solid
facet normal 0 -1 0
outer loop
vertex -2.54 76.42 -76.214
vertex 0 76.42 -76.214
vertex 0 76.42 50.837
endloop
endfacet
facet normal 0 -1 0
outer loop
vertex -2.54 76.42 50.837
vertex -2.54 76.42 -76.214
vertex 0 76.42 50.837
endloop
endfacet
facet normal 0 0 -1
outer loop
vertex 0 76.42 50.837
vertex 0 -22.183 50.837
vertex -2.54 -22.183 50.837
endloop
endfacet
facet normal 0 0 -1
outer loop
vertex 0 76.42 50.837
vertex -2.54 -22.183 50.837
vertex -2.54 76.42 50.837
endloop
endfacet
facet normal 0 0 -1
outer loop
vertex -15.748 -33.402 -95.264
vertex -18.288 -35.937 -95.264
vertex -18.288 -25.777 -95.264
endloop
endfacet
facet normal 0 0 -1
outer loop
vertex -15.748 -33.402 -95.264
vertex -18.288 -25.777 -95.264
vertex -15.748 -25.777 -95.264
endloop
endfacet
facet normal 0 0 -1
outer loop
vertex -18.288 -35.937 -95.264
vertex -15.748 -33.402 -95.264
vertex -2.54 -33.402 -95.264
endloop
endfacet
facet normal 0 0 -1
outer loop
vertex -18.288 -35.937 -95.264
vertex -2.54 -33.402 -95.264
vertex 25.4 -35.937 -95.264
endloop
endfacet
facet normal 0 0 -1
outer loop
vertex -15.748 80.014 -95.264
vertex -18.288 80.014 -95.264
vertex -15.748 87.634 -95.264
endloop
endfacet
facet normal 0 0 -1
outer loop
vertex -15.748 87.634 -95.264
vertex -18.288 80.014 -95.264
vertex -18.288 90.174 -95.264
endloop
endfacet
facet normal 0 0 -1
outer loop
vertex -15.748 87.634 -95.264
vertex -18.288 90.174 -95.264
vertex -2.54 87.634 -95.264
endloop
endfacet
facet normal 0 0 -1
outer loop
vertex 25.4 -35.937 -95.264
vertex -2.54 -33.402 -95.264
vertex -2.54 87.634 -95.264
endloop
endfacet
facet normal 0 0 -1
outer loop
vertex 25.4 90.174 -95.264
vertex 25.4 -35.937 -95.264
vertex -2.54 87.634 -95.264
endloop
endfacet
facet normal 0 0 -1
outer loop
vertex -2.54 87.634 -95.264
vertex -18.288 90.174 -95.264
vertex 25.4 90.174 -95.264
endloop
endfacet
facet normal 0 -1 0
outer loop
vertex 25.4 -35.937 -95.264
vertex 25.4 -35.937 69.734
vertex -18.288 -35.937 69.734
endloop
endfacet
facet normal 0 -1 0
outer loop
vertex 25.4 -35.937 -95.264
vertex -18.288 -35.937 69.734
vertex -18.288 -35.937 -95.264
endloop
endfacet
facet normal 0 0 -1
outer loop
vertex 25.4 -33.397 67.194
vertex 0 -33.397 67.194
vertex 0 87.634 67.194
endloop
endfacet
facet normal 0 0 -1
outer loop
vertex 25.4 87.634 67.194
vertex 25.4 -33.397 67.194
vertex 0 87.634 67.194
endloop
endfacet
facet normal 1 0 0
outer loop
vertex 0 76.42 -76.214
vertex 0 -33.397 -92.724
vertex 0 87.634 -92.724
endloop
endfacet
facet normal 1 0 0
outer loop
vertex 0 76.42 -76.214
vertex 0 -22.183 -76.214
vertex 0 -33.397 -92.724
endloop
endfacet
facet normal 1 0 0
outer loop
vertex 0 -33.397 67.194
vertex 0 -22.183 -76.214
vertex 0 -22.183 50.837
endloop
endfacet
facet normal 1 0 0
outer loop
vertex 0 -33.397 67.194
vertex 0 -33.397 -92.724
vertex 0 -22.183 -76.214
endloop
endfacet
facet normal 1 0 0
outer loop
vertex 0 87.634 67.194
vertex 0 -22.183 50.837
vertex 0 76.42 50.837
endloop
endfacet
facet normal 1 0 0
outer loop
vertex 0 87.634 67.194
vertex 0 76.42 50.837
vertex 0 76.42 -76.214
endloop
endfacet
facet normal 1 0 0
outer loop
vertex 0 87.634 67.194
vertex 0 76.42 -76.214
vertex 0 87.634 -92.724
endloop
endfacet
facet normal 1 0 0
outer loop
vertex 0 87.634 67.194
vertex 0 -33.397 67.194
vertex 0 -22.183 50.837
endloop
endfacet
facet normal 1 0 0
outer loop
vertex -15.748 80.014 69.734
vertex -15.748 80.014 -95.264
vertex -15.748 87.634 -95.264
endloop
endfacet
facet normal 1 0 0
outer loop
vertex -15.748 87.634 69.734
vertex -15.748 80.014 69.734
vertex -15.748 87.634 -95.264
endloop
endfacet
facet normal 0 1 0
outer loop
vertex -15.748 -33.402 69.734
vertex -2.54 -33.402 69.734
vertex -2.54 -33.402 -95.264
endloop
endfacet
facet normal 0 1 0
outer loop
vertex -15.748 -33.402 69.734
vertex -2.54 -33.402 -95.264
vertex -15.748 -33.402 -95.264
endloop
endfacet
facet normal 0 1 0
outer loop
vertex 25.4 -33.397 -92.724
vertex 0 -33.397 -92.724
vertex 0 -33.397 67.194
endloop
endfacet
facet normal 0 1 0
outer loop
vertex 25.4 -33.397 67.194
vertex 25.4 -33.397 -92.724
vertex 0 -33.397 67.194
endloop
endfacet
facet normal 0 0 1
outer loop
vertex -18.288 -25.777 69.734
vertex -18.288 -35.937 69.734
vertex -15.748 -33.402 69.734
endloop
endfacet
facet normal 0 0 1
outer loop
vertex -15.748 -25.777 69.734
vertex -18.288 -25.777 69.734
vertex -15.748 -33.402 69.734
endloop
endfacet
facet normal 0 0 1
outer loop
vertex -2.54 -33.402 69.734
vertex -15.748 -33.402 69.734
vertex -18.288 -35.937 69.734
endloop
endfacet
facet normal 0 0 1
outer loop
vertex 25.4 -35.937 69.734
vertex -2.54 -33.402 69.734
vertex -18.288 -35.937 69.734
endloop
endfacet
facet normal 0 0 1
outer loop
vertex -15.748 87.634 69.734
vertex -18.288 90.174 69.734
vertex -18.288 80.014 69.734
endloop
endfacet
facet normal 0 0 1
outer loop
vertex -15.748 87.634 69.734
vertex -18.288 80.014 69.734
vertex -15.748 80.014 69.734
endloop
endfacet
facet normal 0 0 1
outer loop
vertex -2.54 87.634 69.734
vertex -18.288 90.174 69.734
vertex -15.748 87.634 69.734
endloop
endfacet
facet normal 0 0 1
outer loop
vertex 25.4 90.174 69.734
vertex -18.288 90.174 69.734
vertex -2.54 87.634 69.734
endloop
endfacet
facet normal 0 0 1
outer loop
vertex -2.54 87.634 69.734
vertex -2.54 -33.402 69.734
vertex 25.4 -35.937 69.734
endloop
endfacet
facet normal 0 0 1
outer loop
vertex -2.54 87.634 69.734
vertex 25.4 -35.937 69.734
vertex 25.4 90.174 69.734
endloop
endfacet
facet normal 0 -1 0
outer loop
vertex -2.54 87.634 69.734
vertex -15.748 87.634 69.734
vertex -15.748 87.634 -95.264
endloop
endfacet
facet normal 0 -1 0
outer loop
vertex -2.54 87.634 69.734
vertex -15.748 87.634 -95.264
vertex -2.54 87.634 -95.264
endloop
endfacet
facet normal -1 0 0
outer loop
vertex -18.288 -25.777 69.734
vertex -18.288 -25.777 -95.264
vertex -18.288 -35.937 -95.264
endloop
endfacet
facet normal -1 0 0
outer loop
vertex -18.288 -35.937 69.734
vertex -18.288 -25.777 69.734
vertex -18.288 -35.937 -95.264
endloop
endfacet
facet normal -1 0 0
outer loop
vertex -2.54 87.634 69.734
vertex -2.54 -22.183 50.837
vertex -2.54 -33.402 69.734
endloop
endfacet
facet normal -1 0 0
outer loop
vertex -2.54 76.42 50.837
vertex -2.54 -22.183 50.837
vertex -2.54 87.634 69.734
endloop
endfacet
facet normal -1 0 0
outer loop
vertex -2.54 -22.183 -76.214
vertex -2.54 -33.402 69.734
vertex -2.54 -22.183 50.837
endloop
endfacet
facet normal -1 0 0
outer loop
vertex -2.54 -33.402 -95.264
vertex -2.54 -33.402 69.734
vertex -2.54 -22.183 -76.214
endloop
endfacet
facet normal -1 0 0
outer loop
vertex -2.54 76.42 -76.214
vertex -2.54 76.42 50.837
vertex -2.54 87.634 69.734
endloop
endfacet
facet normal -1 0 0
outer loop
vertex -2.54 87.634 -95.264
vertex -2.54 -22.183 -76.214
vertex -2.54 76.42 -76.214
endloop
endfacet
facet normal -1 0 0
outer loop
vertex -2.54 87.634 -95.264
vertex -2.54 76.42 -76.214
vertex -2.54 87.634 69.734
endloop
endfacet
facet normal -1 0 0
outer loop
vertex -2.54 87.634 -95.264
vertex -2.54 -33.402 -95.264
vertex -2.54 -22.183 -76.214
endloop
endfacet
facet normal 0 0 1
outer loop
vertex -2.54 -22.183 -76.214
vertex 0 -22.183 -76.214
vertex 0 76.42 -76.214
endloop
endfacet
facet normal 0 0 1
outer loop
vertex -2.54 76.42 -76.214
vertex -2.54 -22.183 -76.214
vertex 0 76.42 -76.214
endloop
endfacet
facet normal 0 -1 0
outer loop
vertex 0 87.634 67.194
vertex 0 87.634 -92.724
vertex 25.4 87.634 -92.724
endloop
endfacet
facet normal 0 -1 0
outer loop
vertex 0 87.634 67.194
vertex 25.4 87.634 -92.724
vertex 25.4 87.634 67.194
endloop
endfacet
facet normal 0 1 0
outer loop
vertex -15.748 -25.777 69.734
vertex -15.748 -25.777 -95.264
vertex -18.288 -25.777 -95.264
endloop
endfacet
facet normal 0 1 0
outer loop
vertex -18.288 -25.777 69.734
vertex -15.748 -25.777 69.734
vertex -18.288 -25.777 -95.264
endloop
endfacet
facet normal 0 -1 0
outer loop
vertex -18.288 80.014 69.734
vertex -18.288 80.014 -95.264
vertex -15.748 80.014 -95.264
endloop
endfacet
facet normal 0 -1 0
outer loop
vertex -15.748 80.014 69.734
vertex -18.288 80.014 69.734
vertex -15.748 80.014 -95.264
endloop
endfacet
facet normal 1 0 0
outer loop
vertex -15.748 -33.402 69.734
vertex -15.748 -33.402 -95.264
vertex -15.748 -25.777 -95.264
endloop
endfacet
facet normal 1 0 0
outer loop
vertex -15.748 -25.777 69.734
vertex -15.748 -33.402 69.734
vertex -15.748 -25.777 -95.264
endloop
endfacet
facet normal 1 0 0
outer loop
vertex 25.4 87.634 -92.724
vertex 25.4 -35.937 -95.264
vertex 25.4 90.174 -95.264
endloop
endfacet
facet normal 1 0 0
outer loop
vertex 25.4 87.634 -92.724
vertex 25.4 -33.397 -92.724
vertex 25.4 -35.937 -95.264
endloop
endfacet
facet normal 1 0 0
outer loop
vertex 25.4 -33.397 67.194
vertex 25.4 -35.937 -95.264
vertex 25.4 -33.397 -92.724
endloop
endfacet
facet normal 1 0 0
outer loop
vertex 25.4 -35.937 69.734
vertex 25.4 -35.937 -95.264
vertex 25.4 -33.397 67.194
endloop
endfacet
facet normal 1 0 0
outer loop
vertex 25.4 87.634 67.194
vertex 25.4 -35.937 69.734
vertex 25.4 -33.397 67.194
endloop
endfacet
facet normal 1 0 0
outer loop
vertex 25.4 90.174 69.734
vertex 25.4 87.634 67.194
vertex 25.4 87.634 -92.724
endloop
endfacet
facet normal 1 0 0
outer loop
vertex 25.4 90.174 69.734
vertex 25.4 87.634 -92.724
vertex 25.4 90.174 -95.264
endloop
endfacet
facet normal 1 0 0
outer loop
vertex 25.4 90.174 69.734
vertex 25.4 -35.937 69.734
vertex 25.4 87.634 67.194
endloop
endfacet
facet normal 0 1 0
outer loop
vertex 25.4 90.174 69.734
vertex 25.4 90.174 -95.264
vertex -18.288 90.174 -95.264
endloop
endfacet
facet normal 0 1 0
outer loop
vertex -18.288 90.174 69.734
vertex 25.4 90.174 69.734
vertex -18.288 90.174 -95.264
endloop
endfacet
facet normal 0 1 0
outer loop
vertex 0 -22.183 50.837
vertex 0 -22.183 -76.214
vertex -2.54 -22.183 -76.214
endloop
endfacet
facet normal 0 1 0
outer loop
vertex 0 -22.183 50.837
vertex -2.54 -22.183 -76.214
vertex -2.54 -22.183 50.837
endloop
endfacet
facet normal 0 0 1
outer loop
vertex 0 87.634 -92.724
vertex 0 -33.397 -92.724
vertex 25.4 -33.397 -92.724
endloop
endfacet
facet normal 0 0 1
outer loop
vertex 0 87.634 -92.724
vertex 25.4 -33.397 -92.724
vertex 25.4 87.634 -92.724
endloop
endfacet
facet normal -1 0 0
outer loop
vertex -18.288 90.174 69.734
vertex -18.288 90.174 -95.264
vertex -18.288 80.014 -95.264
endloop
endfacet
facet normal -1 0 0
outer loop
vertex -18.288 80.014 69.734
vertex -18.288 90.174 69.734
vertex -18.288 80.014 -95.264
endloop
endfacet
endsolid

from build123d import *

# Parameters (mm, degrees)
F0_W        = 126.111
F0_H        = 164.9984
F0_W_2      = 121.031
F0_H_2      = 159.9184
F1_DEPTH    = 25.4
F1_FACE_W   = 126.111
F1_FACE_H   = 164.9984
F1_FACE_W_2 = 121.031
F1_FACE_H_2 = 159.9184
F2_DEPTH    = 2.54
F4_DEPTH    = 164.9984
F5_W        = 98.6028
F5_H        = 127.0508
F6_DEPTH    = 25.4


with BuildPart() as f1:
    # F0 (on Right) → F1 (new body)
    with BuildSketch(Plane.YZ):
        with Locations((27.1188945978, -12.7647293852)):
            Rectangle(F0_W, F0_H)
        with Locations((27.1188945978, -12.7647293852)):
            Rectangle(F0_W_2, F0_H_2, mode=Mode.SUBTRACT)
    extrude(amount=F1_DEPTH)

    # F1_face (on face) + F0 (on Right) → F2 (join)
    with BuildSketch(Plane(origin=(0, 27.1188945978, -12.7647293852), x_dir=(0, 1, 0), z_dir=(-1, 0, 0))):
        Rectangle(F1_FACE_W, F1_FACE_H)
        Rectangle(F1_FACE_W_2, F1_FACE_H_2, mode=Mode.SUBTRACT)
    with BuildSketch(Plane.YZ):
        with Locations((27.1188945978, -12.7647293852)):
            Rectangle(F0_W, F0_H)
        with Locations((27.1188945978, -12.7647293852)):
            Rectangle(F0_W_2, F0_H_2, mode=Mode.SUBTRACT)
        with Locations((27.1188945978, -12.7647293852)):
            Rectangle(F0_W_2, F0_H_2)
    extrude(amount=F2_DEPTH, dir=(-1, 0, 0))

    # F3 (on face) → F4 (join)
    with BuildSketch(Plane.XY.offset(69.7344706148)):
        Polygon((-2.54, 87.6343945978), (-2.54, 90.1743945978), (-18.288, 90.1743945978), (-18.288, 80.0143945978), (-15.748, 80.0143945978), (-15.748, 87.6343945978), align=None)
        Polygon((-2.54, -35.9366054022), (-2.54, -33.4024998063), (-15.748, -33.4024998063), (-15.748, -25.7766054022), (-18.288, -25.7766054022), (-18.288, -35.9366054022), align=None)
    extrude(amount=-F4_DEPTH)

    # F5 (on face) → F6 (cut)
    with BuildSketch(Plane.YZ):
        with Locations((27.1188945978, -12.6885293852)):
            Rectangle(F5_W, F5_H)
    extrude(amount=-F6_DEPTH, mode=Mode.SUBTRACT)


solid = f1.part
